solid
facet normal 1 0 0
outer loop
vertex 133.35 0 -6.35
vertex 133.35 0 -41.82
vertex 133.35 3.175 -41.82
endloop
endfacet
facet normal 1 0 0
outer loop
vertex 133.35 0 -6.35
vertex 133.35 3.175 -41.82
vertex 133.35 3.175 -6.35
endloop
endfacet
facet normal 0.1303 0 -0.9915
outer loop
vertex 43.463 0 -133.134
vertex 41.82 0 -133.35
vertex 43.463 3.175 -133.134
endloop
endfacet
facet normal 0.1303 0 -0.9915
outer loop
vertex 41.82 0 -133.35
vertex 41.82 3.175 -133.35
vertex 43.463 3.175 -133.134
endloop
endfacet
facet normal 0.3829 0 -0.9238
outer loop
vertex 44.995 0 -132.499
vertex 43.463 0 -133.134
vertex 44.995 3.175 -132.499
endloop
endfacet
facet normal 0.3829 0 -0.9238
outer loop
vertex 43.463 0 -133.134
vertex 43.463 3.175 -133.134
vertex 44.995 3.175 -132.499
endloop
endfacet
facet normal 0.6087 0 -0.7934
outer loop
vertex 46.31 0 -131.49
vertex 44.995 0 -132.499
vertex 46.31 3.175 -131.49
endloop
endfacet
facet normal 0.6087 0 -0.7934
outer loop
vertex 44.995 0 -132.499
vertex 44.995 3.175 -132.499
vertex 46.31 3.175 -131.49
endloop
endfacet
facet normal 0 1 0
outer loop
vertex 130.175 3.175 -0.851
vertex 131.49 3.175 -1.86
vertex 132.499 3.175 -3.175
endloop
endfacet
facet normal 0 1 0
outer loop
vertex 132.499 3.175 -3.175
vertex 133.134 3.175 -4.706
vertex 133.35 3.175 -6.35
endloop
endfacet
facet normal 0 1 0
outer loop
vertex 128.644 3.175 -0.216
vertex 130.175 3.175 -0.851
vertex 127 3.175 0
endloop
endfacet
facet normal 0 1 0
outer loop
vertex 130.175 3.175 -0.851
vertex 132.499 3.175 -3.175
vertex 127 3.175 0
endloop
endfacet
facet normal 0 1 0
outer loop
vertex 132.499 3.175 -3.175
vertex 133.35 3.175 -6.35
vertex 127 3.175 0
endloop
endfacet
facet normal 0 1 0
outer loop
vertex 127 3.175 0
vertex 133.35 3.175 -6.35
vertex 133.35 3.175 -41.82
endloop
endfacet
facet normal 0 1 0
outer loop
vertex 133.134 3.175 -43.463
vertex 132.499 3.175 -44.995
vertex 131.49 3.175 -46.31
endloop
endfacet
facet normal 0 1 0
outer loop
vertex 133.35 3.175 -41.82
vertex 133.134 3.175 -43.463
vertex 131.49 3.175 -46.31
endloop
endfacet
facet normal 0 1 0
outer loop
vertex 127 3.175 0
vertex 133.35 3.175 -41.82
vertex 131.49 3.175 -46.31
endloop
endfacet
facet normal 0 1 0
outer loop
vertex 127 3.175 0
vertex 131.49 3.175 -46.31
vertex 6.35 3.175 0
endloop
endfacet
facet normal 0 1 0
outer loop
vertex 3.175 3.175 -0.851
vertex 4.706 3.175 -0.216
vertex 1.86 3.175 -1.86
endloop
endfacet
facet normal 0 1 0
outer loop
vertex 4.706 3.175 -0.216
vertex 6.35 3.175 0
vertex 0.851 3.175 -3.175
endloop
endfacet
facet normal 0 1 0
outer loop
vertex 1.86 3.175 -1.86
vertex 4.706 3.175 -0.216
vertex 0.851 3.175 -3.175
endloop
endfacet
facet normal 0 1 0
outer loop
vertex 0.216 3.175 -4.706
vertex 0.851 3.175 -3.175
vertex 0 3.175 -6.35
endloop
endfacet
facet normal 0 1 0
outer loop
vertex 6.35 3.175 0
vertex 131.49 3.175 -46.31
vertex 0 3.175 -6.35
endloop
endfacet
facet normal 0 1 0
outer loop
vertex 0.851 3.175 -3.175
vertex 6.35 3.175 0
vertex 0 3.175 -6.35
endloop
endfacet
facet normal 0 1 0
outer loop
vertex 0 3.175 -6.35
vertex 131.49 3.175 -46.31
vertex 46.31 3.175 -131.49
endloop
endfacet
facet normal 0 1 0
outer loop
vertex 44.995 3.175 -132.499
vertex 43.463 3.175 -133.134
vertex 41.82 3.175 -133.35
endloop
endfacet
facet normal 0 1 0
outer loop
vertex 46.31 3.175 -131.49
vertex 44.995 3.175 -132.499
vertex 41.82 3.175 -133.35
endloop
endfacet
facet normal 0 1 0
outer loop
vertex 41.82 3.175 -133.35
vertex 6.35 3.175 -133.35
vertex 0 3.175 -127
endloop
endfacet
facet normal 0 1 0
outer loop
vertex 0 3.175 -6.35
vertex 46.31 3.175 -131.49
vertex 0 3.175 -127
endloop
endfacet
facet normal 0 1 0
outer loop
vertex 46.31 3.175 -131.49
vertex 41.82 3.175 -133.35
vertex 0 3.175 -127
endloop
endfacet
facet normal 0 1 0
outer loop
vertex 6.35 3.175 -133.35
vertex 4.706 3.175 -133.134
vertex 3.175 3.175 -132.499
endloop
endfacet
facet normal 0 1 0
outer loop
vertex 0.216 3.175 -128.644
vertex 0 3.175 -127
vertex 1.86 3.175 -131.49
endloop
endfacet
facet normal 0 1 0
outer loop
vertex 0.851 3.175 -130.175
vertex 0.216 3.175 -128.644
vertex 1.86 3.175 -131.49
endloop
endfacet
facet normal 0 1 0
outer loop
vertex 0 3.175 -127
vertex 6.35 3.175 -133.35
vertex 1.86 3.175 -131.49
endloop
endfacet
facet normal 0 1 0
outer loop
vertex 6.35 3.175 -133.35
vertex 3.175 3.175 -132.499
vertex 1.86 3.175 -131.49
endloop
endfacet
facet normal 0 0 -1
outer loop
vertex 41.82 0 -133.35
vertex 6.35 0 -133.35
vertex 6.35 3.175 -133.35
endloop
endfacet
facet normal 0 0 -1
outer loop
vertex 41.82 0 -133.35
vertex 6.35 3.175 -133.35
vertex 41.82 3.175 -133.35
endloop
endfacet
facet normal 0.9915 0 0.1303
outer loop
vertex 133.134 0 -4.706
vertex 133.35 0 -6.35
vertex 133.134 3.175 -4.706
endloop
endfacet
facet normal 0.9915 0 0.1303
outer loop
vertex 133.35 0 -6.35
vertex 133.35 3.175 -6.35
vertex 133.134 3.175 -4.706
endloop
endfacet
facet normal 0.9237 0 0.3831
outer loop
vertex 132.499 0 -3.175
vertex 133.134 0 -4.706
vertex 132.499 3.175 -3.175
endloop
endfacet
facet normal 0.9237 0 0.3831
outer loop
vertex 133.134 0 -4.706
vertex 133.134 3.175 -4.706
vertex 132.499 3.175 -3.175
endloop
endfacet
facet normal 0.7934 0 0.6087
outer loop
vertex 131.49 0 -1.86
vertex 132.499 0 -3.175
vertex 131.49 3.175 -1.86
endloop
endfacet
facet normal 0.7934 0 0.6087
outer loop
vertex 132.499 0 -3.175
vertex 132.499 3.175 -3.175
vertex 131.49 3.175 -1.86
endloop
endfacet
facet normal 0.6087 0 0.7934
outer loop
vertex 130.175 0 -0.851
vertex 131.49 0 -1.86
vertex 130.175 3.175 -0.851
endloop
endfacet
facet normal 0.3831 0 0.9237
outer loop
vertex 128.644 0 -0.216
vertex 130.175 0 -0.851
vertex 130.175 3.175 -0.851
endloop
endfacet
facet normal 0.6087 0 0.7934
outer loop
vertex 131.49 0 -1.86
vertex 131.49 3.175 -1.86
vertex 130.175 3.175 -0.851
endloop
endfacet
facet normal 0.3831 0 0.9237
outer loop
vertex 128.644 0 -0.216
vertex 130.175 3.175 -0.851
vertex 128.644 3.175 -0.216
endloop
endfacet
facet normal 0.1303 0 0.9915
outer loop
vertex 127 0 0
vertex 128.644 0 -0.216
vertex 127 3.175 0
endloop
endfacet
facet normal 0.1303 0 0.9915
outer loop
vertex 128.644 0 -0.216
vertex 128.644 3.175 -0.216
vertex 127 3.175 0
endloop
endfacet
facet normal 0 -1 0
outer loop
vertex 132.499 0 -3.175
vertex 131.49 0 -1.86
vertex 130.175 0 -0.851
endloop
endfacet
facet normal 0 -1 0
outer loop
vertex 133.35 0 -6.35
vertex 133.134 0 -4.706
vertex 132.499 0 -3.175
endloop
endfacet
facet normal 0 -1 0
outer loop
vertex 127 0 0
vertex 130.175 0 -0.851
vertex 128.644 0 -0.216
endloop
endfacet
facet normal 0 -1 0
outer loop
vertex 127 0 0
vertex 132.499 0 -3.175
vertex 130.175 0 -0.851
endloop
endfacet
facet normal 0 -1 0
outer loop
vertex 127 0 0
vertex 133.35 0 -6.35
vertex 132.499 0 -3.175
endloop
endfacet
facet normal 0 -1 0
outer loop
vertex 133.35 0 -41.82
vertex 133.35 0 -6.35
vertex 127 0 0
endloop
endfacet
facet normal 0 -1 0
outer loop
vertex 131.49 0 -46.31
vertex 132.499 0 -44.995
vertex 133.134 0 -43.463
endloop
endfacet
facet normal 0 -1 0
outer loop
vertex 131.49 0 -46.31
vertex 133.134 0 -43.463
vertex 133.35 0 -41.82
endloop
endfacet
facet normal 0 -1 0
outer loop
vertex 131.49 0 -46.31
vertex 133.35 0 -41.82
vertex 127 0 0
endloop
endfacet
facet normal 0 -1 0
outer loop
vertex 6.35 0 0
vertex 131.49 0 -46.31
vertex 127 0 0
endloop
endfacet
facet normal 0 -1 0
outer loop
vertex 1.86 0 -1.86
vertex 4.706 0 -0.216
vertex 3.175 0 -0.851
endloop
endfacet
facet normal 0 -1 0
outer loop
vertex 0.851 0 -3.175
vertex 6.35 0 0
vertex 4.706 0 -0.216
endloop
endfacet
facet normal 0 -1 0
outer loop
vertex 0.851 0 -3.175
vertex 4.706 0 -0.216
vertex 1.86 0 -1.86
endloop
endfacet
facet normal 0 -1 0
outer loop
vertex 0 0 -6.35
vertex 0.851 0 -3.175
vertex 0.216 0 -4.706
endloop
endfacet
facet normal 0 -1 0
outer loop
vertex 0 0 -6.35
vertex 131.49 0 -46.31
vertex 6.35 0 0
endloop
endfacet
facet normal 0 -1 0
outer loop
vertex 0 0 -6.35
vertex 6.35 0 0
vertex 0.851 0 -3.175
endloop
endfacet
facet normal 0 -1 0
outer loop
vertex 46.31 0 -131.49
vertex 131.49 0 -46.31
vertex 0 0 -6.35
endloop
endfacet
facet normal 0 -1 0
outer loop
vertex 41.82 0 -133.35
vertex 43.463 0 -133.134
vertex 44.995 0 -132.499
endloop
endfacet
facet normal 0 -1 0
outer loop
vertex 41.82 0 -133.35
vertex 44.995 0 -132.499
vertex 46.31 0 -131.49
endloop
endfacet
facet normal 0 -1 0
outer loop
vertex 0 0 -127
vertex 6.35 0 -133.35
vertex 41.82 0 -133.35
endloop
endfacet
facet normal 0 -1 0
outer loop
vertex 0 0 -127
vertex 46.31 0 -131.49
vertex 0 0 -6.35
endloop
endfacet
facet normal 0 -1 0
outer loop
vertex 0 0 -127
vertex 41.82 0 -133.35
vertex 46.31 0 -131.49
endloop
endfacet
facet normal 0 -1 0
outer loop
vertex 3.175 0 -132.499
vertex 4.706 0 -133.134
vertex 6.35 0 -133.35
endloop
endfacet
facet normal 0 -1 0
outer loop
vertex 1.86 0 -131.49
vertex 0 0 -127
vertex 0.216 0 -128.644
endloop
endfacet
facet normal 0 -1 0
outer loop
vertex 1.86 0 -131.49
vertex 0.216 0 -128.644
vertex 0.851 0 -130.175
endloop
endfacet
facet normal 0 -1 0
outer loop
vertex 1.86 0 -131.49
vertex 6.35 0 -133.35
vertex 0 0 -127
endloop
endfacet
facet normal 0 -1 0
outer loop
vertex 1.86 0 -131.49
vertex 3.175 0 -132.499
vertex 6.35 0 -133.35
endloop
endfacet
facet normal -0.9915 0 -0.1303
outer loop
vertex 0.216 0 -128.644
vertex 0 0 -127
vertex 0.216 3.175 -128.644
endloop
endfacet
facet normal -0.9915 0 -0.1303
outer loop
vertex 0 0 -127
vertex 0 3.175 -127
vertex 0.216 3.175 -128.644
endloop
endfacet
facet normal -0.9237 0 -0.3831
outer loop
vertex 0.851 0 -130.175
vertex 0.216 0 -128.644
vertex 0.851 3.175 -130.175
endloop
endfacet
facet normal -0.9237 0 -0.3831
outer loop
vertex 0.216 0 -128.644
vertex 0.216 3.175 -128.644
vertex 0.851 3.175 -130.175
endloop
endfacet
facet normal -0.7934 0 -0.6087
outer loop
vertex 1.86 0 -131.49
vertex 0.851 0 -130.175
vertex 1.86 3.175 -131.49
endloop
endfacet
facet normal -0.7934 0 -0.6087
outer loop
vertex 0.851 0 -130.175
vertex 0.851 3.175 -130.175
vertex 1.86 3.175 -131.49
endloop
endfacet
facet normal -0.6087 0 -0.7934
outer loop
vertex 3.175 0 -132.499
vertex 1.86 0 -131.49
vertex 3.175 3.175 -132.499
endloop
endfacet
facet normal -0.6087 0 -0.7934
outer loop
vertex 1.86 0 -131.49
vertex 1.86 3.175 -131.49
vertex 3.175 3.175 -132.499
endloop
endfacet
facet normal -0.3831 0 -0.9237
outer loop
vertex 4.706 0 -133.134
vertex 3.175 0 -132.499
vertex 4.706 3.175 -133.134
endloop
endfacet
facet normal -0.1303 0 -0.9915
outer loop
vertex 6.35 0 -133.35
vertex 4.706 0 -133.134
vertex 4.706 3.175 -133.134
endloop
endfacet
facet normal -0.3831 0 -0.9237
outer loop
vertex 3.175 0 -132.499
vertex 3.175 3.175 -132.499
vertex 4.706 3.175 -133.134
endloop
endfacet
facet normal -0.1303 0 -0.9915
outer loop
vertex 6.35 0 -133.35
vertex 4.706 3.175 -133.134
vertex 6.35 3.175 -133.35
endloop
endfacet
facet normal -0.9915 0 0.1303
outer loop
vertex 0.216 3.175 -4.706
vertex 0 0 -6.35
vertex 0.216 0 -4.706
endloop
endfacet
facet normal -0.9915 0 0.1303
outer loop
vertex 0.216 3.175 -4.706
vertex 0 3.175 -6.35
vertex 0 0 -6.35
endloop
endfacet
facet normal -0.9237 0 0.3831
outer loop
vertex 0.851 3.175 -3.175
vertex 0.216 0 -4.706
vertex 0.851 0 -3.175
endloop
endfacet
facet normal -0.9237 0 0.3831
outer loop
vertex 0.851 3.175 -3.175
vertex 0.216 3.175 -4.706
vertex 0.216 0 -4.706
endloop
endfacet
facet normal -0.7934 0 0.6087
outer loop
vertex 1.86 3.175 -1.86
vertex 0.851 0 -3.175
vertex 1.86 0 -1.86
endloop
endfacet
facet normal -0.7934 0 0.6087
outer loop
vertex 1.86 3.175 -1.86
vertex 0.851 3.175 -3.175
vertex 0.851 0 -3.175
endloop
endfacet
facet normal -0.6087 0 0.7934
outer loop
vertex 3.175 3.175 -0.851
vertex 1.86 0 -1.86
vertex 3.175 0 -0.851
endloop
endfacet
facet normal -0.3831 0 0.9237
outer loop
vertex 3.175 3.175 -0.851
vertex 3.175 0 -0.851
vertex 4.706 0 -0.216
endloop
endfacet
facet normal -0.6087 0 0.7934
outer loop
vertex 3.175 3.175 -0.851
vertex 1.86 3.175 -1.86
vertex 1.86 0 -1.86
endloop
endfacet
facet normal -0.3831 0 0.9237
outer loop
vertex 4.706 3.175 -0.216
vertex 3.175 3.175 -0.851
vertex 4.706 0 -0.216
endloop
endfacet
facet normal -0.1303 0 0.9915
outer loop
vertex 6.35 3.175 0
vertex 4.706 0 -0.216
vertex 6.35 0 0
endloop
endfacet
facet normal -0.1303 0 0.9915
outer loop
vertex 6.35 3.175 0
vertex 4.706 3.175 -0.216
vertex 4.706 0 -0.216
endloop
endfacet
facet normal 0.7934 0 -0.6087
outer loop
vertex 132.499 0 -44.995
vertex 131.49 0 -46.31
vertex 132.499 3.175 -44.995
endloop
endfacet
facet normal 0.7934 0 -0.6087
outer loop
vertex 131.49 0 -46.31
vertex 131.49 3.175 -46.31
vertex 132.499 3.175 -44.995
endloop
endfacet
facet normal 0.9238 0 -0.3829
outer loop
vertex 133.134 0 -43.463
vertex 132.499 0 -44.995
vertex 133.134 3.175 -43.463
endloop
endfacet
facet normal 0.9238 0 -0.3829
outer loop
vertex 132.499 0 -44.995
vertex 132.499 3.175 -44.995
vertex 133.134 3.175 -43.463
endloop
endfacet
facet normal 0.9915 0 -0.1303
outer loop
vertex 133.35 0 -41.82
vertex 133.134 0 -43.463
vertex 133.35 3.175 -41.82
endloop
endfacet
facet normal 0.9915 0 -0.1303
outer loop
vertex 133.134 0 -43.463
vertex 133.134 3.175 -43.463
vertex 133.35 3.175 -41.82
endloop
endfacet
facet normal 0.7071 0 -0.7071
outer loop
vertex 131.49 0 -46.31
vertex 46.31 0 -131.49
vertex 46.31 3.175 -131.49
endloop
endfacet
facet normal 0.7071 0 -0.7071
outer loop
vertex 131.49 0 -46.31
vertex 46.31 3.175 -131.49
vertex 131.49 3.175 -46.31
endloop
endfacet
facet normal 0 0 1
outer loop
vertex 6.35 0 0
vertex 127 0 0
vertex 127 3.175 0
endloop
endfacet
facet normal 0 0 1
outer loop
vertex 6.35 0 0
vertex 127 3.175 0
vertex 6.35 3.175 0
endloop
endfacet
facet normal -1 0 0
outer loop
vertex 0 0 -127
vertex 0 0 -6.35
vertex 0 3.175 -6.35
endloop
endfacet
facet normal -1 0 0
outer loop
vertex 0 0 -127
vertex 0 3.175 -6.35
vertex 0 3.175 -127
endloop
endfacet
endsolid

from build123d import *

# Parameters (mm, degrees)
BOSS_EXTRUDE1_DEPTH = 3.175
FILLET1_R           = 6.35


with BuildPart() as part:
    # Sketch1 → Boss-Extrude1 (new body)
    with BuildSketch(Plane(origin=(0, 0, 0), x_dir=(1, 0, 0), z_dir=(0, 1, 0))):
        Polygon((0, 0), (0, 133.35), (44.45, 133.35), (133.35, 44.45), (133.35, 0), align=None)
    extrude(amount=BOSS_EXTRUDE1_DEPTH)

    # Fillet1
    fillet1_edges = [part.edges().sort_by_distance(p)[0] for p in [
        (0, 1.5875, 0),
        (0, 1.5875, -133.35),
        (44.45, 1.5875, -133.35),
        (133.35, 1.5875, -44.45),
        (133.35, 1.5875, 0),
    ]]
    fillet(fillet1_edges, radius=FILLET1_R)


solid = part.part
